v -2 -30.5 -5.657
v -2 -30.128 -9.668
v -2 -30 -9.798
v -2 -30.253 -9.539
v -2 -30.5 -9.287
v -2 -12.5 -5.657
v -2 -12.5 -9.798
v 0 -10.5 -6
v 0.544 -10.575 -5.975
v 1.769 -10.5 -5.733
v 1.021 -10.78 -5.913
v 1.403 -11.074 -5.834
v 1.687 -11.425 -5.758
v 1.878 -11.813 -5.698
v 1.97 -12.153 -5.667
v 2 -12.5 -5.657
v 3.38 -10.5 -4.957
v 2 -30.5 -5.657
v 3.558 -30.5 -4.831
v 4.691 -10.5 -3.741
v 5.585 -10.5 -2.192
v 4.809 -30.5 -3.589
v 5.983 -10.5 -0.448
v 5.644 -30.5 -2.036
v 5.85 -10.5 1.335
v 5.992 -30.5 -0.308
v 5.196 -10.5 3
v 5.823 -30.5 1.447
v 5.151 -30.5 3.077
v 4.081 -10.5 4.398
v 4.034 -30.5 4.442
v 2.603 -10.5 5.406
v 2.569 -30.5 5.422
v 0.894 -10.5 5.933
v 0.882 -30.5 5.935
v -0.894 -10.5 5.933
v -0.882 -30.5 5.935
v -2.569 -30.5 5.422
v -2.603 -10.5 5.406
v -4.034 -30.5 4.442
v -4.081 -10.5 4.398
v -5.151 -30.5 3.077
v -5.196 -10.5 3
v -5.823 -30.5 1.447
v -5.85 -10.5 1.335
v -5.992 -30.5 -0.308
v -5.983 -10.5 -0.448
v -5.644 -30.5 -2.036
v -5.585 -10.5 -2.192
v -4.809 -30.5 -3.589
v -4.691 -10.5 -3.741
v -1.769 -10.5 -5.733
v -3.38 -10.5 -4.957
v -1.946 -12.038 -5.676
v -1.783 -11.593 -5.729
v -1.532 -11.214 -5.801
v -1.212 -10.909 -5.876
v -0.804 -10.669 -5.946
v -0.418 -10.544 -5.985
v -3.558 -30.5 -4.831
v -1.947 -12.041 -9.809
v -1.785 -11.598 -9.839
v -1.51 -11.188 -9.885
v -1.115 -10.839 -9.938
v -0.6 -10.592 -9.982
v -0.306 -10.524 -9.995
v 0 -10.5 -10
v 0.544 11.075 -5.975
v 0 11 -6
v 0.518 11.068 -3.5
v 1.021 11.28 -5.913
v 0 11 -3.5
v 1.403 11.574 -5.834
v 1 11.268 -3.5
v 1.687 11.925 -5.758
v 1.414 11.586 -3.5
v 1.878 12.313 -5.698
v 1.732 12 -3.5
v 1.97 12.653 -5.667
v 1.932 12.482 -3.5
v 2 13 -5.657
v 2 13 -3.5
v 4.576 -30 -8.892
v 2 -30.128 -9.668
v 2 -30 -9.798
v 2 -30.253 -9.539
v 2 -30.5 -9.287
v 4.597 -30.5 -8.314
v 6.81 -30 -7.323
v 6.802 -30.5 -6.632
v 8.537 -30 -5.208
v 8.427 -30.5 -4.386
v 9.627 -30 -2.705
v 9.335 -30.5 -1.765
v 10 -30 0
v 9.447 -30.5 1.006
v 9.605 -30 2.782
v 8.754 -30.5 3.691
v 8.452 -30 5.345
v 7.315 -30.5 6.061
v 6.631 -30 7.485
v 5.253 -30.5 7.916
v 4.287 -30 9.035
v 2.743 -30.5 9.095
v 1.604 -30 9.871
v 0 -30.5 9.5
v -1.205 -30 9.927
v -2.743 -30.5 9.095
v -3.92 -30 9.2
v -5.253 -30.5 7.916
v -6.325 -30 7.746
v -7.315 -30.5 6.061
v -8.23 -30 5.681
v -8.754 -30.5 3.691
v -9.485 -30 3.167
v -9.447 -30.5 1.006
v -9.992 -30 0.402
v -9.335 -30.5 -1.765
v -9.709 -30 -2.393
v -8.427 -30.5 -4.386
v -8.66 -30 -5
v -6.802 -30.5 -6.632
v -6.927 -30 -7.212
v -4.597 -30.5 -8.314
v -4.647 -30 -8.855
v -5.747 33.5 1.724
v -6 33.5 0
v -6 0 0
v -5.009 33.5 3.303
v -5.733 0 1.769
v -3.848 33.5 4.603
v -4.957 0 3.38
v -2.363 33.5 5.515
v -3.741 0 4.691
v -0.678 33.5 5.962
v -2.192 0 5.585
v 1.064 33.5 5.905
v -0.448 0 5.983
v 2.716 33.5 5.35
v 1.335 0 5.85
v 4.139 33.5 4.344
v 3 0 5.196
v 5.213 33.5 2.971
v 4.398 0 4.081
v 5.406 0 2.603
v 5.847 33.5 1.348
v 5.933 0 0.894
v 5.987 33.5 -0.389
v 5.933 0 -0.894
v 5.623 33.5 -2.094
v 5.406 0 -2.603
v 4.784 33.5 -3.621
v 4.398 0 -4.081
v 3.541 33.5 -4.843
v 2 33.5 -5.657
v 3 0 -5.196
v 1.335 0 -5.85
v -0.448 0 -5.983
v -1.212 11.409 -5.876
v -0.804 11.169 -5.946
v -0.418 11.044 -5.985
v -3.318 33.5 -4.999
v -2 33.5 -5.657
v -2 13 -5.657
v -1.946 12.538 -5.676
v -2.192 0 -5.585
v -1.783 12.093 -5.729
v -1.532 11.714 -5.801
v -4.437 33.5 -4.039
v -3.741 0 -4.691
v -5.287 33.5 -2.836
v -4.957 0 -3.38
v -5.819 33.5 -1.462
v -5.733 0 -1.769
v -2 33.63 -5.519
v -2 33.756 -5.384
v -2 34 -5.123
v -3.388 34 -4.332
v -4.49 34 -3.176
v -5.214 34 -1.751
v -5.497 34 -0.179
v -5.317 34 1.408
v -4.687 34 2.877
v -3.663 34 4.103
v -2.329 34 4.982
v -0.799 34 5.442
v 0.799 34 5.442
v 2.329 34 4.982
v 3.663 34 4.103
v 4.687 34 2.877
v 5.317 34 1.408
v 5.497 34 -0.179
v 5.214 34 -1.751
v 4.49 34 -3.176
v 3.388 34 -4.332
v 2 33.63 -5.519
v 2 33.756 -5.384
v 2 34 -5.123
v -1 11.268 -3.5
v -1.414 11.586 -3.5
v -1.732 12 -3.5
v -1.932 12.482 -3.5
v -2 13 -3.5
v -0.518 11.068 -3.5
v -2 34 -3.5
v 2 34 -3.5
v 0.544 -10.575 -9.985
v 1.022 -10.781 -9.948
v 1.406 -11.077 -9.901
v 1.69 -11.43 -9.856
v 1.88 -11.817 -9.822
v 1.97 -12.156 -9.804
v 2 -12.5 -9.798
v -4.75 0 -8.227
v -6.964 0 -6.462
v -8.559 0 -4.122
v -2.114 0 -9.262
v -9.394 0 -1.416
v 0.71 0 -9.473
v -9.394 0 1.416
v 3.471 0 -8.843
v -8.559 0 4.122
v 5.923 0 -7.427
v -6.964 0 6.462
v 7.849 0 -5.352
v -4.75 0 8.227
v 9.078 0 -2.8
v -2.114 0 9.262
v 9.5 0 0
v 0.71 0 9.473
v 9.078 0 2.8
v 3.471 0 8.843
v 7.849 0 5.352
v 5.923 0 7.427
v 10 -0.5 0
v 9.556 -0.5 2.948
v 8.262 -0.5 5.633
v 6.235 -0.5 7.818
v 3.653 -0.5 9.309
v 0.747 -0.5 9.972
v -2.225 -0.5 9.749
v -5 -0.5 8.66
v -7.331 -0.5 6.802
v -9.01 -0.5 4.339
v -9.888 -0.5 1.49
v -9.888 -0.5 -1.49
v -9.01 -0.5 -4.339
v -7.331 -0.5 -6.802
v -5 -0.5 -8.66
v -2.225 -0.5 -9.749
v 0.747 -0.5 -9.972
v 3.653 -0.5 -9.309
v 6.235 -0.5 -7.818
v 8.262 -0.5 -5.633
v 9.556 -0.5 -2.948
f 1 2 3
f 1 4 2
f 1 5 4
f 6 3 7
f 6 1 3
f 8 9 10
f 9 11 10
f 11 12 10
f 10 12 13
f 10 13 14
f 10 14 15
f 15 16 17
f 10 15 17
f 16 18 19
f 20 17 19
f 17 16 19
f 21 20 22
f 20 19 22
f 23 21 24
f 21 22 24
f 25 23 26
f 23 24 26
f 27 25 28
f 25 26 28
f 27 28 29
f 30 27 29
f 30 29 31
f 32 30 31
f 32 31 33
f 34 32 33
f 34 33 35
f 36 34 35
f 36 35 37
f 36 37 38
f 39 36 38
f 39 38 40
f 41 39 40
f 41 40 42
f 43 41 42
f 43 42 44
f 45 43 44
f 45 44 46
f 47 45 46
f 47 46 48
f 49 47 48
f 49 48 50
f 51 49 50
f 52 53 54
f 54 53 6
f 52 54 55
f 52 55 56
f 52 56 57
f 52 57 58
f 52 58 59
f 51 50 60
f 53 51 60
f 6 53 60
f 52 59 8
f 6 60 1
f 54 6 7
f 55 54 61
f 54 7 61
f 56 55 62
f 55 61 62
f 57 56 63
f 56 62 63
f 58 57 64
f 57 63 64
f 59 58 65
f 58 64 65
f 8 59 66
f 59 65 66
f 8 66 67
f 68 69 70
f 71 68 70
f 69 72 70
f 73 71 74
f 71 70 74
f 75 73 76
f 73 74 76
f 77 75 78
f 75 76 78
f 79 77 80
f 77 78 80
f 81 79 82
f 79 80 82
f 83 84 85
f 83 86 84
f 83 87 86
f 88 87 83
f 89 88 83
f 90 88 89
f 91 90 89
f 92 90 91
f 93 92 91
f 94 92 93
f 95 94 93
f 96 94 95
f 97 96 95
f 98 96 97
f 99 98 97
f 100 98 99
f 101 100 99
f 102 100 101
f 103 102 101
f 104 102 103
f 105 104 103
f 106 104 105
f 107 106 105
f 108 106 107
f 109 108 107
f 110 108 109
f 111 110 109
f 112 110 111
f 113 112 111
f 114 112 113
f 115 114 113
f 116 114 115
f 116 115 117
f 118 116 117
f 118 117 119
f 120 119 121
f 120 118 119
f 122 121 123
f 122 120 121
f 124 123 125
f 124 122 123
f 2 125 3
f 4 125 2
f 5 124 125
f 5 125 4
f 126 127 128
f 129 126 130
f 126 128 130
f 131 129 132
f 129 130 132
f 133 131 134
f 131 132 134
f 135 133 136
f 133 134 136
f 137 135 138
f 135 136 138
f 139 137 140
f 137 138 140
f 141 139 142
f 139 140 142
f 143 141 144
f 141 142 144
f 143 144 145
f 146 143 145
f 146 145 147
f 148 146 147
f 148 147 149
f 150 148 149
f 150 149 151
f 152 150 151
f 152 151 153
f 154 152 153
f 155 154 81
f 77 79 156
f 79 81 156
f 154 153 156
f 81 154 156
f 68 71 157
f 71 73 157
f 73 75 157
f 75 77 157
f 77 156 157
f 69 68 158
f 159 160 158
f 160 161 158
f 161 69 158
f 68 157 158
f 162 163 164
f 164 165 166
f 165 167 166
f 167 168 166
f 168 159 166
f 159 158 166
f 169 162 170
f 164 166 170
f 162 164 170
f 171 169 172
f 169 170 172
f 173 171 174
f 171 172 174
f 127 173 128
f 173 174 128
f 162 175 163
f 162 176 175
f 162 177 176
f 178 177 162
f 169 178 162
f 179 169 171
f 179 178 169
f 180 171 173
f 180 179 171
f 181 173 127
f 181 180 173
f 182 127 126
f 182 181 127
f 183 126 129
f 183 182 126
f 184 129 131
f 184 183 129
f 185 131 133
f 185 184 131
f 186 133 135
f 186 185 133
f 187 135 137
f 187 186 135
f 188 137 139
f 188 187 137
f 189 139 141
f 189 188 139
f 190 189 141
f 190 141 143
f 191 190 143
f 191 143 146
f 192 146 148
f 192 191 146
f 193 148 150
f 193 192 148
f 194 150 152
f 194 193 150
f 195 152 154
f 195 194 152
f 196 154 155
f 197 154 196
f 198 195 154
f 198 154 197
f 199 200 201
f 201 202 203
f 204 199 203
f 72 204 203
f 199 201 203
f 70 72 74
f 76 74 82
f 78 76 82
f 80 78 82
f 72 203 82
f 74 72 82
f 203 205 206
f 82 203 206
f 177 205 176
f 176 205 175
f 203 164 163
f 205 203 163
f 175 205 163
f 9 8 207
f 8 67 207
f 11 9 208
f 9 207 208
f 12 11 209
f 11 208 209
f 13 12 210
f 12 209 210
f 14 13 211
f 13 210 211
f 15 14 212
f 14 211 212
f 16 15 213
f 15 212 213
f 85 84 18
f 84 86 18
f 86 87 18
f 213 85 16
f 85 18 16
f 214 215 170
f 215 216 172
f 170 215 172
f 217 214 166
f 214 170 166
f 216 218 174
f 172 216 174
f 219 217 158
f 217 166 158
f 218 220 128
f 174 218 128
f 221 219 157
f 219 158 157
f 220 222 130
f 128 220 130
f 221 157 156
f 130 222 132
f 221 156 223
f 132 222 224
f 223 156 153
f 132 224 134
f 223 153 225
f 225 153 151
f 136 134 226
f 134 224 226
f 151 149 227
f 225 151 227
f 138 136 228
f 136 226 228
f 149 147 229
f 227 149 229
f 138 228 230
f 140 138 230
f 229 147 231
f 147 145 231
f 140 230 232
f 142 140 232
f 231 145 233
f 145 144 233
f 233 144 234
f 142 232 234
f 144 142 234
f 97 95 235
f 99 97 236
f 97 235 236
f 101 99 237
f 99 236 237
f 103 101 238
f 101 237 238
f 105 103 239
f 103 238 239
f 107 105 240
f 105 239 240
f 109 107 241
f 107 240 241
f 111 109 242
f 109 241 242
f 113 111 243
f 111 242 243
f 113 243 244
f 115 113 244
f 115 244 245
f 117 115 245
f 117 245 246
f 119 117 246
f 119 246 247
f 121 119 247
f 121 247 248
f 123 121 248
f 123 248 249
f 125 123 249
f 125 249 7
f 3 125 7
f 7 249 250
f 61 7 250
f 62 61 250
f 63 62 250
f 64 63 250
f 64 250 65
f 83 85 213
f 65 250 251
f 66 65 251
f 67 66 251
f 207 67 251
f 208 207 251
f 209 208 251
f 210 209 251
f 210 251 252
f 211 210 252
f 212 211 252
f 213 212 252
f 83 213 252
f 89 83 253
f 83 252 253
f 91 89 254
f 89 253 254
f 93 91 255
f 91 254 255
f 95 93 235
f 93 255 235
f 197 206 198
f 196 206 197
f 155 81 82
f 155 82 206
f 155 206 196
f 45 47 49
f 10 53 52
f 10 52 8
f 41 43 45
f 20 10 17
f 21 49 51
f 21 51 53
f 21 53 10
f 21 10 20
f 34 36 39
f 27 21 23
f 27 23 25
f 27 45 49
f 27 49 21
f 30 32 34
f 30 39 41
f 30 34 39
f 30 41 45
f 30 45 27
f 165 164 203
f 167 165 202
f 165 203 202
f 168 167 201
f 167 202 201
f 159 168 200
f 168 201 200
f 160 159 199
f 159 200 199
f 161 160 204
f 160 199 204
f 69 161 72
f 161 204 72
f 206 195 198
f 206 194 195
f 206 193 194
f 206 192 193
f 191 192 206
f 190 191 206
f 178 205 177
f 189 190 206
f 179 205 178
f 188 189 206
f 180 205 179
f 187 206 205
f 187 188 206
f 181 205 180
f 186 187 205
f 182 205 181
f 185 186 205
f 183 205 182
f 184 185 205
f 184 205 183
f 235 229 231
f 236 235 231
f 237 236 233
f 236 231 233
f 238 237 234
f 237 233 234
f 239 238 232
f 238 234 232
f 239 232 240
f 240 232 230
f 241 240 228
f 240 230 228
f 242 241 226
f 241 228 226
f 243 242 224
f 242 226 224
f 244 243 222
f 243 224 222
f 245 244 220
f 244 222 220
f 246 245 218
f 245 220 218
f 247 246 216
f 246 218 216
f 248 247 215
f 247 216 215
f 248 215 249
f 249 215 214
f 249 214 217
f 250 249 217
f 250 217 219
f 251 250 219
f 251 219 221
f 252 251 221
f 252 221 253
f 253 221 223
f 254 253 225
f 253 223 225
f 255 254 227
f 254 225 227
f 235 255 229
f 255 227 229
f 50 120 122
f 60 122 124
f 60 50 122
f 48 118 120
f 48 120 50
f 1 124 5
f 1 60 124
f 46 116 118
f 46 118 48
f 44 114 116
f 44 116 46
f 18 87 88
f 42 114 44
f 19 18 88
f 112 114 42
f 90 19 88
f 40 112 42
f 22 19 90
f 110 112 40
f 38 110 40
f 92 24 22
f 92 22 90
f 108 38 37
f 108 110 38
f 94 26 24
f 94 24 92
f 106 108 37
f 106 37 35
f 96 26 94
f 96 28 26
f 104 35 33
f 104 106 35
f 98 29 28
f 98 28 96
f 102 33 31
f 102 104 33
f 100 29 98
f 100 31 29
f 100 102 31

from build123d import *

# Parameters (mm, degrees)
F0_R      = 10
F1_DEPTH  = 30.5
F2_R      = 6
F3_DEPTH  = 20
F4_R      = 6
F5_DEPTH  = 34
F7_W      = 4
F7_H      = 23
F8_DEPTH  = 2.5
F9_R      = 1.9999
F10_W     = 4
F10_H     = 20
F11_DEPTH = 25
F12_R     = 1.9999
F13_SIZE  = 0.5


# Not quite as in the source:
# - a fillet or chamfer is up to 0.001 mm smaller than in the source, because OpenCascade refuses the exact size


with BuildPart() as f1:
    # F0 (on Front) → F1 (new body)
    with BuildSketch(Plane.XZ):
        Circle(F0_R)
    extrude(amount=F1_DEPTH)

    # F2 (on face) → F3 (cut)
    with BuildSketch(Plane.XZ.offset(30.5)):
        Circle(F2_R)
    extrude(amount=-F3_DEPTH, mode=Mode.SUBTRACT)

    # F4 (on face) → F5 (join)
    with BuildSketch(Plane(origin=(0, 0, 0), x_dir=(-1, 0, 0), z_dir=(0, 1, 0))):
        Circle(F4_R)
    extrude(amount=F5_DEPTH)

    # F7 (on offset) → F8 (cut)
    with BuildSketch(Plane.XY.offset(-6)):
        with Locations((0, 22.5)):
            Rectangle(F7_W, F7_H)
    extrude(amount=F8_DEPTH, mode=Mode.SUBTRACT)

    # F9 (radius 2 in the source; OpenCascade refuses exactly that, so slightly less here)
    f9_edges = [f1.edges().sort_by_distance(p)[0] for p in [
        (-2, 11, -4.578427),
        (2, 11, -4.578427),
    ]]
    fillet(f9_edges, radius=F9_R)

    # F10 (on Top) → F11 (cut)
    with BuildSketch(Plane.XY):
        with Locations((0, -20.5)):
            Rectangle(F10_W, F10_H)
    extrude(amount=-F11_DEPTH, mode=Mode.SUBTRACT)

    # F12 (radius 2 in the source; OpenCascade refuses exactly that, so slightly less here)
    f12_edges = [f1.edges().sort_by_distance(p)[0] for p in [
        (2, -10.5, -7.727407),
        (-2, -10.5, -7.727407),
    ]]
    fillet(f12_edges, radius=F12_R)

    # F13
    f13_edges = [f1.edges().sort_by_distance(p)[0] for p in [
        (-10, 0, 0),
        (3.464102, 34, 4.898979),
        (-6.324555, -30.5, 7.745967),
    ]]
    chamfer(f13_edges, length=F13_SIZE)


solid = f1.part
